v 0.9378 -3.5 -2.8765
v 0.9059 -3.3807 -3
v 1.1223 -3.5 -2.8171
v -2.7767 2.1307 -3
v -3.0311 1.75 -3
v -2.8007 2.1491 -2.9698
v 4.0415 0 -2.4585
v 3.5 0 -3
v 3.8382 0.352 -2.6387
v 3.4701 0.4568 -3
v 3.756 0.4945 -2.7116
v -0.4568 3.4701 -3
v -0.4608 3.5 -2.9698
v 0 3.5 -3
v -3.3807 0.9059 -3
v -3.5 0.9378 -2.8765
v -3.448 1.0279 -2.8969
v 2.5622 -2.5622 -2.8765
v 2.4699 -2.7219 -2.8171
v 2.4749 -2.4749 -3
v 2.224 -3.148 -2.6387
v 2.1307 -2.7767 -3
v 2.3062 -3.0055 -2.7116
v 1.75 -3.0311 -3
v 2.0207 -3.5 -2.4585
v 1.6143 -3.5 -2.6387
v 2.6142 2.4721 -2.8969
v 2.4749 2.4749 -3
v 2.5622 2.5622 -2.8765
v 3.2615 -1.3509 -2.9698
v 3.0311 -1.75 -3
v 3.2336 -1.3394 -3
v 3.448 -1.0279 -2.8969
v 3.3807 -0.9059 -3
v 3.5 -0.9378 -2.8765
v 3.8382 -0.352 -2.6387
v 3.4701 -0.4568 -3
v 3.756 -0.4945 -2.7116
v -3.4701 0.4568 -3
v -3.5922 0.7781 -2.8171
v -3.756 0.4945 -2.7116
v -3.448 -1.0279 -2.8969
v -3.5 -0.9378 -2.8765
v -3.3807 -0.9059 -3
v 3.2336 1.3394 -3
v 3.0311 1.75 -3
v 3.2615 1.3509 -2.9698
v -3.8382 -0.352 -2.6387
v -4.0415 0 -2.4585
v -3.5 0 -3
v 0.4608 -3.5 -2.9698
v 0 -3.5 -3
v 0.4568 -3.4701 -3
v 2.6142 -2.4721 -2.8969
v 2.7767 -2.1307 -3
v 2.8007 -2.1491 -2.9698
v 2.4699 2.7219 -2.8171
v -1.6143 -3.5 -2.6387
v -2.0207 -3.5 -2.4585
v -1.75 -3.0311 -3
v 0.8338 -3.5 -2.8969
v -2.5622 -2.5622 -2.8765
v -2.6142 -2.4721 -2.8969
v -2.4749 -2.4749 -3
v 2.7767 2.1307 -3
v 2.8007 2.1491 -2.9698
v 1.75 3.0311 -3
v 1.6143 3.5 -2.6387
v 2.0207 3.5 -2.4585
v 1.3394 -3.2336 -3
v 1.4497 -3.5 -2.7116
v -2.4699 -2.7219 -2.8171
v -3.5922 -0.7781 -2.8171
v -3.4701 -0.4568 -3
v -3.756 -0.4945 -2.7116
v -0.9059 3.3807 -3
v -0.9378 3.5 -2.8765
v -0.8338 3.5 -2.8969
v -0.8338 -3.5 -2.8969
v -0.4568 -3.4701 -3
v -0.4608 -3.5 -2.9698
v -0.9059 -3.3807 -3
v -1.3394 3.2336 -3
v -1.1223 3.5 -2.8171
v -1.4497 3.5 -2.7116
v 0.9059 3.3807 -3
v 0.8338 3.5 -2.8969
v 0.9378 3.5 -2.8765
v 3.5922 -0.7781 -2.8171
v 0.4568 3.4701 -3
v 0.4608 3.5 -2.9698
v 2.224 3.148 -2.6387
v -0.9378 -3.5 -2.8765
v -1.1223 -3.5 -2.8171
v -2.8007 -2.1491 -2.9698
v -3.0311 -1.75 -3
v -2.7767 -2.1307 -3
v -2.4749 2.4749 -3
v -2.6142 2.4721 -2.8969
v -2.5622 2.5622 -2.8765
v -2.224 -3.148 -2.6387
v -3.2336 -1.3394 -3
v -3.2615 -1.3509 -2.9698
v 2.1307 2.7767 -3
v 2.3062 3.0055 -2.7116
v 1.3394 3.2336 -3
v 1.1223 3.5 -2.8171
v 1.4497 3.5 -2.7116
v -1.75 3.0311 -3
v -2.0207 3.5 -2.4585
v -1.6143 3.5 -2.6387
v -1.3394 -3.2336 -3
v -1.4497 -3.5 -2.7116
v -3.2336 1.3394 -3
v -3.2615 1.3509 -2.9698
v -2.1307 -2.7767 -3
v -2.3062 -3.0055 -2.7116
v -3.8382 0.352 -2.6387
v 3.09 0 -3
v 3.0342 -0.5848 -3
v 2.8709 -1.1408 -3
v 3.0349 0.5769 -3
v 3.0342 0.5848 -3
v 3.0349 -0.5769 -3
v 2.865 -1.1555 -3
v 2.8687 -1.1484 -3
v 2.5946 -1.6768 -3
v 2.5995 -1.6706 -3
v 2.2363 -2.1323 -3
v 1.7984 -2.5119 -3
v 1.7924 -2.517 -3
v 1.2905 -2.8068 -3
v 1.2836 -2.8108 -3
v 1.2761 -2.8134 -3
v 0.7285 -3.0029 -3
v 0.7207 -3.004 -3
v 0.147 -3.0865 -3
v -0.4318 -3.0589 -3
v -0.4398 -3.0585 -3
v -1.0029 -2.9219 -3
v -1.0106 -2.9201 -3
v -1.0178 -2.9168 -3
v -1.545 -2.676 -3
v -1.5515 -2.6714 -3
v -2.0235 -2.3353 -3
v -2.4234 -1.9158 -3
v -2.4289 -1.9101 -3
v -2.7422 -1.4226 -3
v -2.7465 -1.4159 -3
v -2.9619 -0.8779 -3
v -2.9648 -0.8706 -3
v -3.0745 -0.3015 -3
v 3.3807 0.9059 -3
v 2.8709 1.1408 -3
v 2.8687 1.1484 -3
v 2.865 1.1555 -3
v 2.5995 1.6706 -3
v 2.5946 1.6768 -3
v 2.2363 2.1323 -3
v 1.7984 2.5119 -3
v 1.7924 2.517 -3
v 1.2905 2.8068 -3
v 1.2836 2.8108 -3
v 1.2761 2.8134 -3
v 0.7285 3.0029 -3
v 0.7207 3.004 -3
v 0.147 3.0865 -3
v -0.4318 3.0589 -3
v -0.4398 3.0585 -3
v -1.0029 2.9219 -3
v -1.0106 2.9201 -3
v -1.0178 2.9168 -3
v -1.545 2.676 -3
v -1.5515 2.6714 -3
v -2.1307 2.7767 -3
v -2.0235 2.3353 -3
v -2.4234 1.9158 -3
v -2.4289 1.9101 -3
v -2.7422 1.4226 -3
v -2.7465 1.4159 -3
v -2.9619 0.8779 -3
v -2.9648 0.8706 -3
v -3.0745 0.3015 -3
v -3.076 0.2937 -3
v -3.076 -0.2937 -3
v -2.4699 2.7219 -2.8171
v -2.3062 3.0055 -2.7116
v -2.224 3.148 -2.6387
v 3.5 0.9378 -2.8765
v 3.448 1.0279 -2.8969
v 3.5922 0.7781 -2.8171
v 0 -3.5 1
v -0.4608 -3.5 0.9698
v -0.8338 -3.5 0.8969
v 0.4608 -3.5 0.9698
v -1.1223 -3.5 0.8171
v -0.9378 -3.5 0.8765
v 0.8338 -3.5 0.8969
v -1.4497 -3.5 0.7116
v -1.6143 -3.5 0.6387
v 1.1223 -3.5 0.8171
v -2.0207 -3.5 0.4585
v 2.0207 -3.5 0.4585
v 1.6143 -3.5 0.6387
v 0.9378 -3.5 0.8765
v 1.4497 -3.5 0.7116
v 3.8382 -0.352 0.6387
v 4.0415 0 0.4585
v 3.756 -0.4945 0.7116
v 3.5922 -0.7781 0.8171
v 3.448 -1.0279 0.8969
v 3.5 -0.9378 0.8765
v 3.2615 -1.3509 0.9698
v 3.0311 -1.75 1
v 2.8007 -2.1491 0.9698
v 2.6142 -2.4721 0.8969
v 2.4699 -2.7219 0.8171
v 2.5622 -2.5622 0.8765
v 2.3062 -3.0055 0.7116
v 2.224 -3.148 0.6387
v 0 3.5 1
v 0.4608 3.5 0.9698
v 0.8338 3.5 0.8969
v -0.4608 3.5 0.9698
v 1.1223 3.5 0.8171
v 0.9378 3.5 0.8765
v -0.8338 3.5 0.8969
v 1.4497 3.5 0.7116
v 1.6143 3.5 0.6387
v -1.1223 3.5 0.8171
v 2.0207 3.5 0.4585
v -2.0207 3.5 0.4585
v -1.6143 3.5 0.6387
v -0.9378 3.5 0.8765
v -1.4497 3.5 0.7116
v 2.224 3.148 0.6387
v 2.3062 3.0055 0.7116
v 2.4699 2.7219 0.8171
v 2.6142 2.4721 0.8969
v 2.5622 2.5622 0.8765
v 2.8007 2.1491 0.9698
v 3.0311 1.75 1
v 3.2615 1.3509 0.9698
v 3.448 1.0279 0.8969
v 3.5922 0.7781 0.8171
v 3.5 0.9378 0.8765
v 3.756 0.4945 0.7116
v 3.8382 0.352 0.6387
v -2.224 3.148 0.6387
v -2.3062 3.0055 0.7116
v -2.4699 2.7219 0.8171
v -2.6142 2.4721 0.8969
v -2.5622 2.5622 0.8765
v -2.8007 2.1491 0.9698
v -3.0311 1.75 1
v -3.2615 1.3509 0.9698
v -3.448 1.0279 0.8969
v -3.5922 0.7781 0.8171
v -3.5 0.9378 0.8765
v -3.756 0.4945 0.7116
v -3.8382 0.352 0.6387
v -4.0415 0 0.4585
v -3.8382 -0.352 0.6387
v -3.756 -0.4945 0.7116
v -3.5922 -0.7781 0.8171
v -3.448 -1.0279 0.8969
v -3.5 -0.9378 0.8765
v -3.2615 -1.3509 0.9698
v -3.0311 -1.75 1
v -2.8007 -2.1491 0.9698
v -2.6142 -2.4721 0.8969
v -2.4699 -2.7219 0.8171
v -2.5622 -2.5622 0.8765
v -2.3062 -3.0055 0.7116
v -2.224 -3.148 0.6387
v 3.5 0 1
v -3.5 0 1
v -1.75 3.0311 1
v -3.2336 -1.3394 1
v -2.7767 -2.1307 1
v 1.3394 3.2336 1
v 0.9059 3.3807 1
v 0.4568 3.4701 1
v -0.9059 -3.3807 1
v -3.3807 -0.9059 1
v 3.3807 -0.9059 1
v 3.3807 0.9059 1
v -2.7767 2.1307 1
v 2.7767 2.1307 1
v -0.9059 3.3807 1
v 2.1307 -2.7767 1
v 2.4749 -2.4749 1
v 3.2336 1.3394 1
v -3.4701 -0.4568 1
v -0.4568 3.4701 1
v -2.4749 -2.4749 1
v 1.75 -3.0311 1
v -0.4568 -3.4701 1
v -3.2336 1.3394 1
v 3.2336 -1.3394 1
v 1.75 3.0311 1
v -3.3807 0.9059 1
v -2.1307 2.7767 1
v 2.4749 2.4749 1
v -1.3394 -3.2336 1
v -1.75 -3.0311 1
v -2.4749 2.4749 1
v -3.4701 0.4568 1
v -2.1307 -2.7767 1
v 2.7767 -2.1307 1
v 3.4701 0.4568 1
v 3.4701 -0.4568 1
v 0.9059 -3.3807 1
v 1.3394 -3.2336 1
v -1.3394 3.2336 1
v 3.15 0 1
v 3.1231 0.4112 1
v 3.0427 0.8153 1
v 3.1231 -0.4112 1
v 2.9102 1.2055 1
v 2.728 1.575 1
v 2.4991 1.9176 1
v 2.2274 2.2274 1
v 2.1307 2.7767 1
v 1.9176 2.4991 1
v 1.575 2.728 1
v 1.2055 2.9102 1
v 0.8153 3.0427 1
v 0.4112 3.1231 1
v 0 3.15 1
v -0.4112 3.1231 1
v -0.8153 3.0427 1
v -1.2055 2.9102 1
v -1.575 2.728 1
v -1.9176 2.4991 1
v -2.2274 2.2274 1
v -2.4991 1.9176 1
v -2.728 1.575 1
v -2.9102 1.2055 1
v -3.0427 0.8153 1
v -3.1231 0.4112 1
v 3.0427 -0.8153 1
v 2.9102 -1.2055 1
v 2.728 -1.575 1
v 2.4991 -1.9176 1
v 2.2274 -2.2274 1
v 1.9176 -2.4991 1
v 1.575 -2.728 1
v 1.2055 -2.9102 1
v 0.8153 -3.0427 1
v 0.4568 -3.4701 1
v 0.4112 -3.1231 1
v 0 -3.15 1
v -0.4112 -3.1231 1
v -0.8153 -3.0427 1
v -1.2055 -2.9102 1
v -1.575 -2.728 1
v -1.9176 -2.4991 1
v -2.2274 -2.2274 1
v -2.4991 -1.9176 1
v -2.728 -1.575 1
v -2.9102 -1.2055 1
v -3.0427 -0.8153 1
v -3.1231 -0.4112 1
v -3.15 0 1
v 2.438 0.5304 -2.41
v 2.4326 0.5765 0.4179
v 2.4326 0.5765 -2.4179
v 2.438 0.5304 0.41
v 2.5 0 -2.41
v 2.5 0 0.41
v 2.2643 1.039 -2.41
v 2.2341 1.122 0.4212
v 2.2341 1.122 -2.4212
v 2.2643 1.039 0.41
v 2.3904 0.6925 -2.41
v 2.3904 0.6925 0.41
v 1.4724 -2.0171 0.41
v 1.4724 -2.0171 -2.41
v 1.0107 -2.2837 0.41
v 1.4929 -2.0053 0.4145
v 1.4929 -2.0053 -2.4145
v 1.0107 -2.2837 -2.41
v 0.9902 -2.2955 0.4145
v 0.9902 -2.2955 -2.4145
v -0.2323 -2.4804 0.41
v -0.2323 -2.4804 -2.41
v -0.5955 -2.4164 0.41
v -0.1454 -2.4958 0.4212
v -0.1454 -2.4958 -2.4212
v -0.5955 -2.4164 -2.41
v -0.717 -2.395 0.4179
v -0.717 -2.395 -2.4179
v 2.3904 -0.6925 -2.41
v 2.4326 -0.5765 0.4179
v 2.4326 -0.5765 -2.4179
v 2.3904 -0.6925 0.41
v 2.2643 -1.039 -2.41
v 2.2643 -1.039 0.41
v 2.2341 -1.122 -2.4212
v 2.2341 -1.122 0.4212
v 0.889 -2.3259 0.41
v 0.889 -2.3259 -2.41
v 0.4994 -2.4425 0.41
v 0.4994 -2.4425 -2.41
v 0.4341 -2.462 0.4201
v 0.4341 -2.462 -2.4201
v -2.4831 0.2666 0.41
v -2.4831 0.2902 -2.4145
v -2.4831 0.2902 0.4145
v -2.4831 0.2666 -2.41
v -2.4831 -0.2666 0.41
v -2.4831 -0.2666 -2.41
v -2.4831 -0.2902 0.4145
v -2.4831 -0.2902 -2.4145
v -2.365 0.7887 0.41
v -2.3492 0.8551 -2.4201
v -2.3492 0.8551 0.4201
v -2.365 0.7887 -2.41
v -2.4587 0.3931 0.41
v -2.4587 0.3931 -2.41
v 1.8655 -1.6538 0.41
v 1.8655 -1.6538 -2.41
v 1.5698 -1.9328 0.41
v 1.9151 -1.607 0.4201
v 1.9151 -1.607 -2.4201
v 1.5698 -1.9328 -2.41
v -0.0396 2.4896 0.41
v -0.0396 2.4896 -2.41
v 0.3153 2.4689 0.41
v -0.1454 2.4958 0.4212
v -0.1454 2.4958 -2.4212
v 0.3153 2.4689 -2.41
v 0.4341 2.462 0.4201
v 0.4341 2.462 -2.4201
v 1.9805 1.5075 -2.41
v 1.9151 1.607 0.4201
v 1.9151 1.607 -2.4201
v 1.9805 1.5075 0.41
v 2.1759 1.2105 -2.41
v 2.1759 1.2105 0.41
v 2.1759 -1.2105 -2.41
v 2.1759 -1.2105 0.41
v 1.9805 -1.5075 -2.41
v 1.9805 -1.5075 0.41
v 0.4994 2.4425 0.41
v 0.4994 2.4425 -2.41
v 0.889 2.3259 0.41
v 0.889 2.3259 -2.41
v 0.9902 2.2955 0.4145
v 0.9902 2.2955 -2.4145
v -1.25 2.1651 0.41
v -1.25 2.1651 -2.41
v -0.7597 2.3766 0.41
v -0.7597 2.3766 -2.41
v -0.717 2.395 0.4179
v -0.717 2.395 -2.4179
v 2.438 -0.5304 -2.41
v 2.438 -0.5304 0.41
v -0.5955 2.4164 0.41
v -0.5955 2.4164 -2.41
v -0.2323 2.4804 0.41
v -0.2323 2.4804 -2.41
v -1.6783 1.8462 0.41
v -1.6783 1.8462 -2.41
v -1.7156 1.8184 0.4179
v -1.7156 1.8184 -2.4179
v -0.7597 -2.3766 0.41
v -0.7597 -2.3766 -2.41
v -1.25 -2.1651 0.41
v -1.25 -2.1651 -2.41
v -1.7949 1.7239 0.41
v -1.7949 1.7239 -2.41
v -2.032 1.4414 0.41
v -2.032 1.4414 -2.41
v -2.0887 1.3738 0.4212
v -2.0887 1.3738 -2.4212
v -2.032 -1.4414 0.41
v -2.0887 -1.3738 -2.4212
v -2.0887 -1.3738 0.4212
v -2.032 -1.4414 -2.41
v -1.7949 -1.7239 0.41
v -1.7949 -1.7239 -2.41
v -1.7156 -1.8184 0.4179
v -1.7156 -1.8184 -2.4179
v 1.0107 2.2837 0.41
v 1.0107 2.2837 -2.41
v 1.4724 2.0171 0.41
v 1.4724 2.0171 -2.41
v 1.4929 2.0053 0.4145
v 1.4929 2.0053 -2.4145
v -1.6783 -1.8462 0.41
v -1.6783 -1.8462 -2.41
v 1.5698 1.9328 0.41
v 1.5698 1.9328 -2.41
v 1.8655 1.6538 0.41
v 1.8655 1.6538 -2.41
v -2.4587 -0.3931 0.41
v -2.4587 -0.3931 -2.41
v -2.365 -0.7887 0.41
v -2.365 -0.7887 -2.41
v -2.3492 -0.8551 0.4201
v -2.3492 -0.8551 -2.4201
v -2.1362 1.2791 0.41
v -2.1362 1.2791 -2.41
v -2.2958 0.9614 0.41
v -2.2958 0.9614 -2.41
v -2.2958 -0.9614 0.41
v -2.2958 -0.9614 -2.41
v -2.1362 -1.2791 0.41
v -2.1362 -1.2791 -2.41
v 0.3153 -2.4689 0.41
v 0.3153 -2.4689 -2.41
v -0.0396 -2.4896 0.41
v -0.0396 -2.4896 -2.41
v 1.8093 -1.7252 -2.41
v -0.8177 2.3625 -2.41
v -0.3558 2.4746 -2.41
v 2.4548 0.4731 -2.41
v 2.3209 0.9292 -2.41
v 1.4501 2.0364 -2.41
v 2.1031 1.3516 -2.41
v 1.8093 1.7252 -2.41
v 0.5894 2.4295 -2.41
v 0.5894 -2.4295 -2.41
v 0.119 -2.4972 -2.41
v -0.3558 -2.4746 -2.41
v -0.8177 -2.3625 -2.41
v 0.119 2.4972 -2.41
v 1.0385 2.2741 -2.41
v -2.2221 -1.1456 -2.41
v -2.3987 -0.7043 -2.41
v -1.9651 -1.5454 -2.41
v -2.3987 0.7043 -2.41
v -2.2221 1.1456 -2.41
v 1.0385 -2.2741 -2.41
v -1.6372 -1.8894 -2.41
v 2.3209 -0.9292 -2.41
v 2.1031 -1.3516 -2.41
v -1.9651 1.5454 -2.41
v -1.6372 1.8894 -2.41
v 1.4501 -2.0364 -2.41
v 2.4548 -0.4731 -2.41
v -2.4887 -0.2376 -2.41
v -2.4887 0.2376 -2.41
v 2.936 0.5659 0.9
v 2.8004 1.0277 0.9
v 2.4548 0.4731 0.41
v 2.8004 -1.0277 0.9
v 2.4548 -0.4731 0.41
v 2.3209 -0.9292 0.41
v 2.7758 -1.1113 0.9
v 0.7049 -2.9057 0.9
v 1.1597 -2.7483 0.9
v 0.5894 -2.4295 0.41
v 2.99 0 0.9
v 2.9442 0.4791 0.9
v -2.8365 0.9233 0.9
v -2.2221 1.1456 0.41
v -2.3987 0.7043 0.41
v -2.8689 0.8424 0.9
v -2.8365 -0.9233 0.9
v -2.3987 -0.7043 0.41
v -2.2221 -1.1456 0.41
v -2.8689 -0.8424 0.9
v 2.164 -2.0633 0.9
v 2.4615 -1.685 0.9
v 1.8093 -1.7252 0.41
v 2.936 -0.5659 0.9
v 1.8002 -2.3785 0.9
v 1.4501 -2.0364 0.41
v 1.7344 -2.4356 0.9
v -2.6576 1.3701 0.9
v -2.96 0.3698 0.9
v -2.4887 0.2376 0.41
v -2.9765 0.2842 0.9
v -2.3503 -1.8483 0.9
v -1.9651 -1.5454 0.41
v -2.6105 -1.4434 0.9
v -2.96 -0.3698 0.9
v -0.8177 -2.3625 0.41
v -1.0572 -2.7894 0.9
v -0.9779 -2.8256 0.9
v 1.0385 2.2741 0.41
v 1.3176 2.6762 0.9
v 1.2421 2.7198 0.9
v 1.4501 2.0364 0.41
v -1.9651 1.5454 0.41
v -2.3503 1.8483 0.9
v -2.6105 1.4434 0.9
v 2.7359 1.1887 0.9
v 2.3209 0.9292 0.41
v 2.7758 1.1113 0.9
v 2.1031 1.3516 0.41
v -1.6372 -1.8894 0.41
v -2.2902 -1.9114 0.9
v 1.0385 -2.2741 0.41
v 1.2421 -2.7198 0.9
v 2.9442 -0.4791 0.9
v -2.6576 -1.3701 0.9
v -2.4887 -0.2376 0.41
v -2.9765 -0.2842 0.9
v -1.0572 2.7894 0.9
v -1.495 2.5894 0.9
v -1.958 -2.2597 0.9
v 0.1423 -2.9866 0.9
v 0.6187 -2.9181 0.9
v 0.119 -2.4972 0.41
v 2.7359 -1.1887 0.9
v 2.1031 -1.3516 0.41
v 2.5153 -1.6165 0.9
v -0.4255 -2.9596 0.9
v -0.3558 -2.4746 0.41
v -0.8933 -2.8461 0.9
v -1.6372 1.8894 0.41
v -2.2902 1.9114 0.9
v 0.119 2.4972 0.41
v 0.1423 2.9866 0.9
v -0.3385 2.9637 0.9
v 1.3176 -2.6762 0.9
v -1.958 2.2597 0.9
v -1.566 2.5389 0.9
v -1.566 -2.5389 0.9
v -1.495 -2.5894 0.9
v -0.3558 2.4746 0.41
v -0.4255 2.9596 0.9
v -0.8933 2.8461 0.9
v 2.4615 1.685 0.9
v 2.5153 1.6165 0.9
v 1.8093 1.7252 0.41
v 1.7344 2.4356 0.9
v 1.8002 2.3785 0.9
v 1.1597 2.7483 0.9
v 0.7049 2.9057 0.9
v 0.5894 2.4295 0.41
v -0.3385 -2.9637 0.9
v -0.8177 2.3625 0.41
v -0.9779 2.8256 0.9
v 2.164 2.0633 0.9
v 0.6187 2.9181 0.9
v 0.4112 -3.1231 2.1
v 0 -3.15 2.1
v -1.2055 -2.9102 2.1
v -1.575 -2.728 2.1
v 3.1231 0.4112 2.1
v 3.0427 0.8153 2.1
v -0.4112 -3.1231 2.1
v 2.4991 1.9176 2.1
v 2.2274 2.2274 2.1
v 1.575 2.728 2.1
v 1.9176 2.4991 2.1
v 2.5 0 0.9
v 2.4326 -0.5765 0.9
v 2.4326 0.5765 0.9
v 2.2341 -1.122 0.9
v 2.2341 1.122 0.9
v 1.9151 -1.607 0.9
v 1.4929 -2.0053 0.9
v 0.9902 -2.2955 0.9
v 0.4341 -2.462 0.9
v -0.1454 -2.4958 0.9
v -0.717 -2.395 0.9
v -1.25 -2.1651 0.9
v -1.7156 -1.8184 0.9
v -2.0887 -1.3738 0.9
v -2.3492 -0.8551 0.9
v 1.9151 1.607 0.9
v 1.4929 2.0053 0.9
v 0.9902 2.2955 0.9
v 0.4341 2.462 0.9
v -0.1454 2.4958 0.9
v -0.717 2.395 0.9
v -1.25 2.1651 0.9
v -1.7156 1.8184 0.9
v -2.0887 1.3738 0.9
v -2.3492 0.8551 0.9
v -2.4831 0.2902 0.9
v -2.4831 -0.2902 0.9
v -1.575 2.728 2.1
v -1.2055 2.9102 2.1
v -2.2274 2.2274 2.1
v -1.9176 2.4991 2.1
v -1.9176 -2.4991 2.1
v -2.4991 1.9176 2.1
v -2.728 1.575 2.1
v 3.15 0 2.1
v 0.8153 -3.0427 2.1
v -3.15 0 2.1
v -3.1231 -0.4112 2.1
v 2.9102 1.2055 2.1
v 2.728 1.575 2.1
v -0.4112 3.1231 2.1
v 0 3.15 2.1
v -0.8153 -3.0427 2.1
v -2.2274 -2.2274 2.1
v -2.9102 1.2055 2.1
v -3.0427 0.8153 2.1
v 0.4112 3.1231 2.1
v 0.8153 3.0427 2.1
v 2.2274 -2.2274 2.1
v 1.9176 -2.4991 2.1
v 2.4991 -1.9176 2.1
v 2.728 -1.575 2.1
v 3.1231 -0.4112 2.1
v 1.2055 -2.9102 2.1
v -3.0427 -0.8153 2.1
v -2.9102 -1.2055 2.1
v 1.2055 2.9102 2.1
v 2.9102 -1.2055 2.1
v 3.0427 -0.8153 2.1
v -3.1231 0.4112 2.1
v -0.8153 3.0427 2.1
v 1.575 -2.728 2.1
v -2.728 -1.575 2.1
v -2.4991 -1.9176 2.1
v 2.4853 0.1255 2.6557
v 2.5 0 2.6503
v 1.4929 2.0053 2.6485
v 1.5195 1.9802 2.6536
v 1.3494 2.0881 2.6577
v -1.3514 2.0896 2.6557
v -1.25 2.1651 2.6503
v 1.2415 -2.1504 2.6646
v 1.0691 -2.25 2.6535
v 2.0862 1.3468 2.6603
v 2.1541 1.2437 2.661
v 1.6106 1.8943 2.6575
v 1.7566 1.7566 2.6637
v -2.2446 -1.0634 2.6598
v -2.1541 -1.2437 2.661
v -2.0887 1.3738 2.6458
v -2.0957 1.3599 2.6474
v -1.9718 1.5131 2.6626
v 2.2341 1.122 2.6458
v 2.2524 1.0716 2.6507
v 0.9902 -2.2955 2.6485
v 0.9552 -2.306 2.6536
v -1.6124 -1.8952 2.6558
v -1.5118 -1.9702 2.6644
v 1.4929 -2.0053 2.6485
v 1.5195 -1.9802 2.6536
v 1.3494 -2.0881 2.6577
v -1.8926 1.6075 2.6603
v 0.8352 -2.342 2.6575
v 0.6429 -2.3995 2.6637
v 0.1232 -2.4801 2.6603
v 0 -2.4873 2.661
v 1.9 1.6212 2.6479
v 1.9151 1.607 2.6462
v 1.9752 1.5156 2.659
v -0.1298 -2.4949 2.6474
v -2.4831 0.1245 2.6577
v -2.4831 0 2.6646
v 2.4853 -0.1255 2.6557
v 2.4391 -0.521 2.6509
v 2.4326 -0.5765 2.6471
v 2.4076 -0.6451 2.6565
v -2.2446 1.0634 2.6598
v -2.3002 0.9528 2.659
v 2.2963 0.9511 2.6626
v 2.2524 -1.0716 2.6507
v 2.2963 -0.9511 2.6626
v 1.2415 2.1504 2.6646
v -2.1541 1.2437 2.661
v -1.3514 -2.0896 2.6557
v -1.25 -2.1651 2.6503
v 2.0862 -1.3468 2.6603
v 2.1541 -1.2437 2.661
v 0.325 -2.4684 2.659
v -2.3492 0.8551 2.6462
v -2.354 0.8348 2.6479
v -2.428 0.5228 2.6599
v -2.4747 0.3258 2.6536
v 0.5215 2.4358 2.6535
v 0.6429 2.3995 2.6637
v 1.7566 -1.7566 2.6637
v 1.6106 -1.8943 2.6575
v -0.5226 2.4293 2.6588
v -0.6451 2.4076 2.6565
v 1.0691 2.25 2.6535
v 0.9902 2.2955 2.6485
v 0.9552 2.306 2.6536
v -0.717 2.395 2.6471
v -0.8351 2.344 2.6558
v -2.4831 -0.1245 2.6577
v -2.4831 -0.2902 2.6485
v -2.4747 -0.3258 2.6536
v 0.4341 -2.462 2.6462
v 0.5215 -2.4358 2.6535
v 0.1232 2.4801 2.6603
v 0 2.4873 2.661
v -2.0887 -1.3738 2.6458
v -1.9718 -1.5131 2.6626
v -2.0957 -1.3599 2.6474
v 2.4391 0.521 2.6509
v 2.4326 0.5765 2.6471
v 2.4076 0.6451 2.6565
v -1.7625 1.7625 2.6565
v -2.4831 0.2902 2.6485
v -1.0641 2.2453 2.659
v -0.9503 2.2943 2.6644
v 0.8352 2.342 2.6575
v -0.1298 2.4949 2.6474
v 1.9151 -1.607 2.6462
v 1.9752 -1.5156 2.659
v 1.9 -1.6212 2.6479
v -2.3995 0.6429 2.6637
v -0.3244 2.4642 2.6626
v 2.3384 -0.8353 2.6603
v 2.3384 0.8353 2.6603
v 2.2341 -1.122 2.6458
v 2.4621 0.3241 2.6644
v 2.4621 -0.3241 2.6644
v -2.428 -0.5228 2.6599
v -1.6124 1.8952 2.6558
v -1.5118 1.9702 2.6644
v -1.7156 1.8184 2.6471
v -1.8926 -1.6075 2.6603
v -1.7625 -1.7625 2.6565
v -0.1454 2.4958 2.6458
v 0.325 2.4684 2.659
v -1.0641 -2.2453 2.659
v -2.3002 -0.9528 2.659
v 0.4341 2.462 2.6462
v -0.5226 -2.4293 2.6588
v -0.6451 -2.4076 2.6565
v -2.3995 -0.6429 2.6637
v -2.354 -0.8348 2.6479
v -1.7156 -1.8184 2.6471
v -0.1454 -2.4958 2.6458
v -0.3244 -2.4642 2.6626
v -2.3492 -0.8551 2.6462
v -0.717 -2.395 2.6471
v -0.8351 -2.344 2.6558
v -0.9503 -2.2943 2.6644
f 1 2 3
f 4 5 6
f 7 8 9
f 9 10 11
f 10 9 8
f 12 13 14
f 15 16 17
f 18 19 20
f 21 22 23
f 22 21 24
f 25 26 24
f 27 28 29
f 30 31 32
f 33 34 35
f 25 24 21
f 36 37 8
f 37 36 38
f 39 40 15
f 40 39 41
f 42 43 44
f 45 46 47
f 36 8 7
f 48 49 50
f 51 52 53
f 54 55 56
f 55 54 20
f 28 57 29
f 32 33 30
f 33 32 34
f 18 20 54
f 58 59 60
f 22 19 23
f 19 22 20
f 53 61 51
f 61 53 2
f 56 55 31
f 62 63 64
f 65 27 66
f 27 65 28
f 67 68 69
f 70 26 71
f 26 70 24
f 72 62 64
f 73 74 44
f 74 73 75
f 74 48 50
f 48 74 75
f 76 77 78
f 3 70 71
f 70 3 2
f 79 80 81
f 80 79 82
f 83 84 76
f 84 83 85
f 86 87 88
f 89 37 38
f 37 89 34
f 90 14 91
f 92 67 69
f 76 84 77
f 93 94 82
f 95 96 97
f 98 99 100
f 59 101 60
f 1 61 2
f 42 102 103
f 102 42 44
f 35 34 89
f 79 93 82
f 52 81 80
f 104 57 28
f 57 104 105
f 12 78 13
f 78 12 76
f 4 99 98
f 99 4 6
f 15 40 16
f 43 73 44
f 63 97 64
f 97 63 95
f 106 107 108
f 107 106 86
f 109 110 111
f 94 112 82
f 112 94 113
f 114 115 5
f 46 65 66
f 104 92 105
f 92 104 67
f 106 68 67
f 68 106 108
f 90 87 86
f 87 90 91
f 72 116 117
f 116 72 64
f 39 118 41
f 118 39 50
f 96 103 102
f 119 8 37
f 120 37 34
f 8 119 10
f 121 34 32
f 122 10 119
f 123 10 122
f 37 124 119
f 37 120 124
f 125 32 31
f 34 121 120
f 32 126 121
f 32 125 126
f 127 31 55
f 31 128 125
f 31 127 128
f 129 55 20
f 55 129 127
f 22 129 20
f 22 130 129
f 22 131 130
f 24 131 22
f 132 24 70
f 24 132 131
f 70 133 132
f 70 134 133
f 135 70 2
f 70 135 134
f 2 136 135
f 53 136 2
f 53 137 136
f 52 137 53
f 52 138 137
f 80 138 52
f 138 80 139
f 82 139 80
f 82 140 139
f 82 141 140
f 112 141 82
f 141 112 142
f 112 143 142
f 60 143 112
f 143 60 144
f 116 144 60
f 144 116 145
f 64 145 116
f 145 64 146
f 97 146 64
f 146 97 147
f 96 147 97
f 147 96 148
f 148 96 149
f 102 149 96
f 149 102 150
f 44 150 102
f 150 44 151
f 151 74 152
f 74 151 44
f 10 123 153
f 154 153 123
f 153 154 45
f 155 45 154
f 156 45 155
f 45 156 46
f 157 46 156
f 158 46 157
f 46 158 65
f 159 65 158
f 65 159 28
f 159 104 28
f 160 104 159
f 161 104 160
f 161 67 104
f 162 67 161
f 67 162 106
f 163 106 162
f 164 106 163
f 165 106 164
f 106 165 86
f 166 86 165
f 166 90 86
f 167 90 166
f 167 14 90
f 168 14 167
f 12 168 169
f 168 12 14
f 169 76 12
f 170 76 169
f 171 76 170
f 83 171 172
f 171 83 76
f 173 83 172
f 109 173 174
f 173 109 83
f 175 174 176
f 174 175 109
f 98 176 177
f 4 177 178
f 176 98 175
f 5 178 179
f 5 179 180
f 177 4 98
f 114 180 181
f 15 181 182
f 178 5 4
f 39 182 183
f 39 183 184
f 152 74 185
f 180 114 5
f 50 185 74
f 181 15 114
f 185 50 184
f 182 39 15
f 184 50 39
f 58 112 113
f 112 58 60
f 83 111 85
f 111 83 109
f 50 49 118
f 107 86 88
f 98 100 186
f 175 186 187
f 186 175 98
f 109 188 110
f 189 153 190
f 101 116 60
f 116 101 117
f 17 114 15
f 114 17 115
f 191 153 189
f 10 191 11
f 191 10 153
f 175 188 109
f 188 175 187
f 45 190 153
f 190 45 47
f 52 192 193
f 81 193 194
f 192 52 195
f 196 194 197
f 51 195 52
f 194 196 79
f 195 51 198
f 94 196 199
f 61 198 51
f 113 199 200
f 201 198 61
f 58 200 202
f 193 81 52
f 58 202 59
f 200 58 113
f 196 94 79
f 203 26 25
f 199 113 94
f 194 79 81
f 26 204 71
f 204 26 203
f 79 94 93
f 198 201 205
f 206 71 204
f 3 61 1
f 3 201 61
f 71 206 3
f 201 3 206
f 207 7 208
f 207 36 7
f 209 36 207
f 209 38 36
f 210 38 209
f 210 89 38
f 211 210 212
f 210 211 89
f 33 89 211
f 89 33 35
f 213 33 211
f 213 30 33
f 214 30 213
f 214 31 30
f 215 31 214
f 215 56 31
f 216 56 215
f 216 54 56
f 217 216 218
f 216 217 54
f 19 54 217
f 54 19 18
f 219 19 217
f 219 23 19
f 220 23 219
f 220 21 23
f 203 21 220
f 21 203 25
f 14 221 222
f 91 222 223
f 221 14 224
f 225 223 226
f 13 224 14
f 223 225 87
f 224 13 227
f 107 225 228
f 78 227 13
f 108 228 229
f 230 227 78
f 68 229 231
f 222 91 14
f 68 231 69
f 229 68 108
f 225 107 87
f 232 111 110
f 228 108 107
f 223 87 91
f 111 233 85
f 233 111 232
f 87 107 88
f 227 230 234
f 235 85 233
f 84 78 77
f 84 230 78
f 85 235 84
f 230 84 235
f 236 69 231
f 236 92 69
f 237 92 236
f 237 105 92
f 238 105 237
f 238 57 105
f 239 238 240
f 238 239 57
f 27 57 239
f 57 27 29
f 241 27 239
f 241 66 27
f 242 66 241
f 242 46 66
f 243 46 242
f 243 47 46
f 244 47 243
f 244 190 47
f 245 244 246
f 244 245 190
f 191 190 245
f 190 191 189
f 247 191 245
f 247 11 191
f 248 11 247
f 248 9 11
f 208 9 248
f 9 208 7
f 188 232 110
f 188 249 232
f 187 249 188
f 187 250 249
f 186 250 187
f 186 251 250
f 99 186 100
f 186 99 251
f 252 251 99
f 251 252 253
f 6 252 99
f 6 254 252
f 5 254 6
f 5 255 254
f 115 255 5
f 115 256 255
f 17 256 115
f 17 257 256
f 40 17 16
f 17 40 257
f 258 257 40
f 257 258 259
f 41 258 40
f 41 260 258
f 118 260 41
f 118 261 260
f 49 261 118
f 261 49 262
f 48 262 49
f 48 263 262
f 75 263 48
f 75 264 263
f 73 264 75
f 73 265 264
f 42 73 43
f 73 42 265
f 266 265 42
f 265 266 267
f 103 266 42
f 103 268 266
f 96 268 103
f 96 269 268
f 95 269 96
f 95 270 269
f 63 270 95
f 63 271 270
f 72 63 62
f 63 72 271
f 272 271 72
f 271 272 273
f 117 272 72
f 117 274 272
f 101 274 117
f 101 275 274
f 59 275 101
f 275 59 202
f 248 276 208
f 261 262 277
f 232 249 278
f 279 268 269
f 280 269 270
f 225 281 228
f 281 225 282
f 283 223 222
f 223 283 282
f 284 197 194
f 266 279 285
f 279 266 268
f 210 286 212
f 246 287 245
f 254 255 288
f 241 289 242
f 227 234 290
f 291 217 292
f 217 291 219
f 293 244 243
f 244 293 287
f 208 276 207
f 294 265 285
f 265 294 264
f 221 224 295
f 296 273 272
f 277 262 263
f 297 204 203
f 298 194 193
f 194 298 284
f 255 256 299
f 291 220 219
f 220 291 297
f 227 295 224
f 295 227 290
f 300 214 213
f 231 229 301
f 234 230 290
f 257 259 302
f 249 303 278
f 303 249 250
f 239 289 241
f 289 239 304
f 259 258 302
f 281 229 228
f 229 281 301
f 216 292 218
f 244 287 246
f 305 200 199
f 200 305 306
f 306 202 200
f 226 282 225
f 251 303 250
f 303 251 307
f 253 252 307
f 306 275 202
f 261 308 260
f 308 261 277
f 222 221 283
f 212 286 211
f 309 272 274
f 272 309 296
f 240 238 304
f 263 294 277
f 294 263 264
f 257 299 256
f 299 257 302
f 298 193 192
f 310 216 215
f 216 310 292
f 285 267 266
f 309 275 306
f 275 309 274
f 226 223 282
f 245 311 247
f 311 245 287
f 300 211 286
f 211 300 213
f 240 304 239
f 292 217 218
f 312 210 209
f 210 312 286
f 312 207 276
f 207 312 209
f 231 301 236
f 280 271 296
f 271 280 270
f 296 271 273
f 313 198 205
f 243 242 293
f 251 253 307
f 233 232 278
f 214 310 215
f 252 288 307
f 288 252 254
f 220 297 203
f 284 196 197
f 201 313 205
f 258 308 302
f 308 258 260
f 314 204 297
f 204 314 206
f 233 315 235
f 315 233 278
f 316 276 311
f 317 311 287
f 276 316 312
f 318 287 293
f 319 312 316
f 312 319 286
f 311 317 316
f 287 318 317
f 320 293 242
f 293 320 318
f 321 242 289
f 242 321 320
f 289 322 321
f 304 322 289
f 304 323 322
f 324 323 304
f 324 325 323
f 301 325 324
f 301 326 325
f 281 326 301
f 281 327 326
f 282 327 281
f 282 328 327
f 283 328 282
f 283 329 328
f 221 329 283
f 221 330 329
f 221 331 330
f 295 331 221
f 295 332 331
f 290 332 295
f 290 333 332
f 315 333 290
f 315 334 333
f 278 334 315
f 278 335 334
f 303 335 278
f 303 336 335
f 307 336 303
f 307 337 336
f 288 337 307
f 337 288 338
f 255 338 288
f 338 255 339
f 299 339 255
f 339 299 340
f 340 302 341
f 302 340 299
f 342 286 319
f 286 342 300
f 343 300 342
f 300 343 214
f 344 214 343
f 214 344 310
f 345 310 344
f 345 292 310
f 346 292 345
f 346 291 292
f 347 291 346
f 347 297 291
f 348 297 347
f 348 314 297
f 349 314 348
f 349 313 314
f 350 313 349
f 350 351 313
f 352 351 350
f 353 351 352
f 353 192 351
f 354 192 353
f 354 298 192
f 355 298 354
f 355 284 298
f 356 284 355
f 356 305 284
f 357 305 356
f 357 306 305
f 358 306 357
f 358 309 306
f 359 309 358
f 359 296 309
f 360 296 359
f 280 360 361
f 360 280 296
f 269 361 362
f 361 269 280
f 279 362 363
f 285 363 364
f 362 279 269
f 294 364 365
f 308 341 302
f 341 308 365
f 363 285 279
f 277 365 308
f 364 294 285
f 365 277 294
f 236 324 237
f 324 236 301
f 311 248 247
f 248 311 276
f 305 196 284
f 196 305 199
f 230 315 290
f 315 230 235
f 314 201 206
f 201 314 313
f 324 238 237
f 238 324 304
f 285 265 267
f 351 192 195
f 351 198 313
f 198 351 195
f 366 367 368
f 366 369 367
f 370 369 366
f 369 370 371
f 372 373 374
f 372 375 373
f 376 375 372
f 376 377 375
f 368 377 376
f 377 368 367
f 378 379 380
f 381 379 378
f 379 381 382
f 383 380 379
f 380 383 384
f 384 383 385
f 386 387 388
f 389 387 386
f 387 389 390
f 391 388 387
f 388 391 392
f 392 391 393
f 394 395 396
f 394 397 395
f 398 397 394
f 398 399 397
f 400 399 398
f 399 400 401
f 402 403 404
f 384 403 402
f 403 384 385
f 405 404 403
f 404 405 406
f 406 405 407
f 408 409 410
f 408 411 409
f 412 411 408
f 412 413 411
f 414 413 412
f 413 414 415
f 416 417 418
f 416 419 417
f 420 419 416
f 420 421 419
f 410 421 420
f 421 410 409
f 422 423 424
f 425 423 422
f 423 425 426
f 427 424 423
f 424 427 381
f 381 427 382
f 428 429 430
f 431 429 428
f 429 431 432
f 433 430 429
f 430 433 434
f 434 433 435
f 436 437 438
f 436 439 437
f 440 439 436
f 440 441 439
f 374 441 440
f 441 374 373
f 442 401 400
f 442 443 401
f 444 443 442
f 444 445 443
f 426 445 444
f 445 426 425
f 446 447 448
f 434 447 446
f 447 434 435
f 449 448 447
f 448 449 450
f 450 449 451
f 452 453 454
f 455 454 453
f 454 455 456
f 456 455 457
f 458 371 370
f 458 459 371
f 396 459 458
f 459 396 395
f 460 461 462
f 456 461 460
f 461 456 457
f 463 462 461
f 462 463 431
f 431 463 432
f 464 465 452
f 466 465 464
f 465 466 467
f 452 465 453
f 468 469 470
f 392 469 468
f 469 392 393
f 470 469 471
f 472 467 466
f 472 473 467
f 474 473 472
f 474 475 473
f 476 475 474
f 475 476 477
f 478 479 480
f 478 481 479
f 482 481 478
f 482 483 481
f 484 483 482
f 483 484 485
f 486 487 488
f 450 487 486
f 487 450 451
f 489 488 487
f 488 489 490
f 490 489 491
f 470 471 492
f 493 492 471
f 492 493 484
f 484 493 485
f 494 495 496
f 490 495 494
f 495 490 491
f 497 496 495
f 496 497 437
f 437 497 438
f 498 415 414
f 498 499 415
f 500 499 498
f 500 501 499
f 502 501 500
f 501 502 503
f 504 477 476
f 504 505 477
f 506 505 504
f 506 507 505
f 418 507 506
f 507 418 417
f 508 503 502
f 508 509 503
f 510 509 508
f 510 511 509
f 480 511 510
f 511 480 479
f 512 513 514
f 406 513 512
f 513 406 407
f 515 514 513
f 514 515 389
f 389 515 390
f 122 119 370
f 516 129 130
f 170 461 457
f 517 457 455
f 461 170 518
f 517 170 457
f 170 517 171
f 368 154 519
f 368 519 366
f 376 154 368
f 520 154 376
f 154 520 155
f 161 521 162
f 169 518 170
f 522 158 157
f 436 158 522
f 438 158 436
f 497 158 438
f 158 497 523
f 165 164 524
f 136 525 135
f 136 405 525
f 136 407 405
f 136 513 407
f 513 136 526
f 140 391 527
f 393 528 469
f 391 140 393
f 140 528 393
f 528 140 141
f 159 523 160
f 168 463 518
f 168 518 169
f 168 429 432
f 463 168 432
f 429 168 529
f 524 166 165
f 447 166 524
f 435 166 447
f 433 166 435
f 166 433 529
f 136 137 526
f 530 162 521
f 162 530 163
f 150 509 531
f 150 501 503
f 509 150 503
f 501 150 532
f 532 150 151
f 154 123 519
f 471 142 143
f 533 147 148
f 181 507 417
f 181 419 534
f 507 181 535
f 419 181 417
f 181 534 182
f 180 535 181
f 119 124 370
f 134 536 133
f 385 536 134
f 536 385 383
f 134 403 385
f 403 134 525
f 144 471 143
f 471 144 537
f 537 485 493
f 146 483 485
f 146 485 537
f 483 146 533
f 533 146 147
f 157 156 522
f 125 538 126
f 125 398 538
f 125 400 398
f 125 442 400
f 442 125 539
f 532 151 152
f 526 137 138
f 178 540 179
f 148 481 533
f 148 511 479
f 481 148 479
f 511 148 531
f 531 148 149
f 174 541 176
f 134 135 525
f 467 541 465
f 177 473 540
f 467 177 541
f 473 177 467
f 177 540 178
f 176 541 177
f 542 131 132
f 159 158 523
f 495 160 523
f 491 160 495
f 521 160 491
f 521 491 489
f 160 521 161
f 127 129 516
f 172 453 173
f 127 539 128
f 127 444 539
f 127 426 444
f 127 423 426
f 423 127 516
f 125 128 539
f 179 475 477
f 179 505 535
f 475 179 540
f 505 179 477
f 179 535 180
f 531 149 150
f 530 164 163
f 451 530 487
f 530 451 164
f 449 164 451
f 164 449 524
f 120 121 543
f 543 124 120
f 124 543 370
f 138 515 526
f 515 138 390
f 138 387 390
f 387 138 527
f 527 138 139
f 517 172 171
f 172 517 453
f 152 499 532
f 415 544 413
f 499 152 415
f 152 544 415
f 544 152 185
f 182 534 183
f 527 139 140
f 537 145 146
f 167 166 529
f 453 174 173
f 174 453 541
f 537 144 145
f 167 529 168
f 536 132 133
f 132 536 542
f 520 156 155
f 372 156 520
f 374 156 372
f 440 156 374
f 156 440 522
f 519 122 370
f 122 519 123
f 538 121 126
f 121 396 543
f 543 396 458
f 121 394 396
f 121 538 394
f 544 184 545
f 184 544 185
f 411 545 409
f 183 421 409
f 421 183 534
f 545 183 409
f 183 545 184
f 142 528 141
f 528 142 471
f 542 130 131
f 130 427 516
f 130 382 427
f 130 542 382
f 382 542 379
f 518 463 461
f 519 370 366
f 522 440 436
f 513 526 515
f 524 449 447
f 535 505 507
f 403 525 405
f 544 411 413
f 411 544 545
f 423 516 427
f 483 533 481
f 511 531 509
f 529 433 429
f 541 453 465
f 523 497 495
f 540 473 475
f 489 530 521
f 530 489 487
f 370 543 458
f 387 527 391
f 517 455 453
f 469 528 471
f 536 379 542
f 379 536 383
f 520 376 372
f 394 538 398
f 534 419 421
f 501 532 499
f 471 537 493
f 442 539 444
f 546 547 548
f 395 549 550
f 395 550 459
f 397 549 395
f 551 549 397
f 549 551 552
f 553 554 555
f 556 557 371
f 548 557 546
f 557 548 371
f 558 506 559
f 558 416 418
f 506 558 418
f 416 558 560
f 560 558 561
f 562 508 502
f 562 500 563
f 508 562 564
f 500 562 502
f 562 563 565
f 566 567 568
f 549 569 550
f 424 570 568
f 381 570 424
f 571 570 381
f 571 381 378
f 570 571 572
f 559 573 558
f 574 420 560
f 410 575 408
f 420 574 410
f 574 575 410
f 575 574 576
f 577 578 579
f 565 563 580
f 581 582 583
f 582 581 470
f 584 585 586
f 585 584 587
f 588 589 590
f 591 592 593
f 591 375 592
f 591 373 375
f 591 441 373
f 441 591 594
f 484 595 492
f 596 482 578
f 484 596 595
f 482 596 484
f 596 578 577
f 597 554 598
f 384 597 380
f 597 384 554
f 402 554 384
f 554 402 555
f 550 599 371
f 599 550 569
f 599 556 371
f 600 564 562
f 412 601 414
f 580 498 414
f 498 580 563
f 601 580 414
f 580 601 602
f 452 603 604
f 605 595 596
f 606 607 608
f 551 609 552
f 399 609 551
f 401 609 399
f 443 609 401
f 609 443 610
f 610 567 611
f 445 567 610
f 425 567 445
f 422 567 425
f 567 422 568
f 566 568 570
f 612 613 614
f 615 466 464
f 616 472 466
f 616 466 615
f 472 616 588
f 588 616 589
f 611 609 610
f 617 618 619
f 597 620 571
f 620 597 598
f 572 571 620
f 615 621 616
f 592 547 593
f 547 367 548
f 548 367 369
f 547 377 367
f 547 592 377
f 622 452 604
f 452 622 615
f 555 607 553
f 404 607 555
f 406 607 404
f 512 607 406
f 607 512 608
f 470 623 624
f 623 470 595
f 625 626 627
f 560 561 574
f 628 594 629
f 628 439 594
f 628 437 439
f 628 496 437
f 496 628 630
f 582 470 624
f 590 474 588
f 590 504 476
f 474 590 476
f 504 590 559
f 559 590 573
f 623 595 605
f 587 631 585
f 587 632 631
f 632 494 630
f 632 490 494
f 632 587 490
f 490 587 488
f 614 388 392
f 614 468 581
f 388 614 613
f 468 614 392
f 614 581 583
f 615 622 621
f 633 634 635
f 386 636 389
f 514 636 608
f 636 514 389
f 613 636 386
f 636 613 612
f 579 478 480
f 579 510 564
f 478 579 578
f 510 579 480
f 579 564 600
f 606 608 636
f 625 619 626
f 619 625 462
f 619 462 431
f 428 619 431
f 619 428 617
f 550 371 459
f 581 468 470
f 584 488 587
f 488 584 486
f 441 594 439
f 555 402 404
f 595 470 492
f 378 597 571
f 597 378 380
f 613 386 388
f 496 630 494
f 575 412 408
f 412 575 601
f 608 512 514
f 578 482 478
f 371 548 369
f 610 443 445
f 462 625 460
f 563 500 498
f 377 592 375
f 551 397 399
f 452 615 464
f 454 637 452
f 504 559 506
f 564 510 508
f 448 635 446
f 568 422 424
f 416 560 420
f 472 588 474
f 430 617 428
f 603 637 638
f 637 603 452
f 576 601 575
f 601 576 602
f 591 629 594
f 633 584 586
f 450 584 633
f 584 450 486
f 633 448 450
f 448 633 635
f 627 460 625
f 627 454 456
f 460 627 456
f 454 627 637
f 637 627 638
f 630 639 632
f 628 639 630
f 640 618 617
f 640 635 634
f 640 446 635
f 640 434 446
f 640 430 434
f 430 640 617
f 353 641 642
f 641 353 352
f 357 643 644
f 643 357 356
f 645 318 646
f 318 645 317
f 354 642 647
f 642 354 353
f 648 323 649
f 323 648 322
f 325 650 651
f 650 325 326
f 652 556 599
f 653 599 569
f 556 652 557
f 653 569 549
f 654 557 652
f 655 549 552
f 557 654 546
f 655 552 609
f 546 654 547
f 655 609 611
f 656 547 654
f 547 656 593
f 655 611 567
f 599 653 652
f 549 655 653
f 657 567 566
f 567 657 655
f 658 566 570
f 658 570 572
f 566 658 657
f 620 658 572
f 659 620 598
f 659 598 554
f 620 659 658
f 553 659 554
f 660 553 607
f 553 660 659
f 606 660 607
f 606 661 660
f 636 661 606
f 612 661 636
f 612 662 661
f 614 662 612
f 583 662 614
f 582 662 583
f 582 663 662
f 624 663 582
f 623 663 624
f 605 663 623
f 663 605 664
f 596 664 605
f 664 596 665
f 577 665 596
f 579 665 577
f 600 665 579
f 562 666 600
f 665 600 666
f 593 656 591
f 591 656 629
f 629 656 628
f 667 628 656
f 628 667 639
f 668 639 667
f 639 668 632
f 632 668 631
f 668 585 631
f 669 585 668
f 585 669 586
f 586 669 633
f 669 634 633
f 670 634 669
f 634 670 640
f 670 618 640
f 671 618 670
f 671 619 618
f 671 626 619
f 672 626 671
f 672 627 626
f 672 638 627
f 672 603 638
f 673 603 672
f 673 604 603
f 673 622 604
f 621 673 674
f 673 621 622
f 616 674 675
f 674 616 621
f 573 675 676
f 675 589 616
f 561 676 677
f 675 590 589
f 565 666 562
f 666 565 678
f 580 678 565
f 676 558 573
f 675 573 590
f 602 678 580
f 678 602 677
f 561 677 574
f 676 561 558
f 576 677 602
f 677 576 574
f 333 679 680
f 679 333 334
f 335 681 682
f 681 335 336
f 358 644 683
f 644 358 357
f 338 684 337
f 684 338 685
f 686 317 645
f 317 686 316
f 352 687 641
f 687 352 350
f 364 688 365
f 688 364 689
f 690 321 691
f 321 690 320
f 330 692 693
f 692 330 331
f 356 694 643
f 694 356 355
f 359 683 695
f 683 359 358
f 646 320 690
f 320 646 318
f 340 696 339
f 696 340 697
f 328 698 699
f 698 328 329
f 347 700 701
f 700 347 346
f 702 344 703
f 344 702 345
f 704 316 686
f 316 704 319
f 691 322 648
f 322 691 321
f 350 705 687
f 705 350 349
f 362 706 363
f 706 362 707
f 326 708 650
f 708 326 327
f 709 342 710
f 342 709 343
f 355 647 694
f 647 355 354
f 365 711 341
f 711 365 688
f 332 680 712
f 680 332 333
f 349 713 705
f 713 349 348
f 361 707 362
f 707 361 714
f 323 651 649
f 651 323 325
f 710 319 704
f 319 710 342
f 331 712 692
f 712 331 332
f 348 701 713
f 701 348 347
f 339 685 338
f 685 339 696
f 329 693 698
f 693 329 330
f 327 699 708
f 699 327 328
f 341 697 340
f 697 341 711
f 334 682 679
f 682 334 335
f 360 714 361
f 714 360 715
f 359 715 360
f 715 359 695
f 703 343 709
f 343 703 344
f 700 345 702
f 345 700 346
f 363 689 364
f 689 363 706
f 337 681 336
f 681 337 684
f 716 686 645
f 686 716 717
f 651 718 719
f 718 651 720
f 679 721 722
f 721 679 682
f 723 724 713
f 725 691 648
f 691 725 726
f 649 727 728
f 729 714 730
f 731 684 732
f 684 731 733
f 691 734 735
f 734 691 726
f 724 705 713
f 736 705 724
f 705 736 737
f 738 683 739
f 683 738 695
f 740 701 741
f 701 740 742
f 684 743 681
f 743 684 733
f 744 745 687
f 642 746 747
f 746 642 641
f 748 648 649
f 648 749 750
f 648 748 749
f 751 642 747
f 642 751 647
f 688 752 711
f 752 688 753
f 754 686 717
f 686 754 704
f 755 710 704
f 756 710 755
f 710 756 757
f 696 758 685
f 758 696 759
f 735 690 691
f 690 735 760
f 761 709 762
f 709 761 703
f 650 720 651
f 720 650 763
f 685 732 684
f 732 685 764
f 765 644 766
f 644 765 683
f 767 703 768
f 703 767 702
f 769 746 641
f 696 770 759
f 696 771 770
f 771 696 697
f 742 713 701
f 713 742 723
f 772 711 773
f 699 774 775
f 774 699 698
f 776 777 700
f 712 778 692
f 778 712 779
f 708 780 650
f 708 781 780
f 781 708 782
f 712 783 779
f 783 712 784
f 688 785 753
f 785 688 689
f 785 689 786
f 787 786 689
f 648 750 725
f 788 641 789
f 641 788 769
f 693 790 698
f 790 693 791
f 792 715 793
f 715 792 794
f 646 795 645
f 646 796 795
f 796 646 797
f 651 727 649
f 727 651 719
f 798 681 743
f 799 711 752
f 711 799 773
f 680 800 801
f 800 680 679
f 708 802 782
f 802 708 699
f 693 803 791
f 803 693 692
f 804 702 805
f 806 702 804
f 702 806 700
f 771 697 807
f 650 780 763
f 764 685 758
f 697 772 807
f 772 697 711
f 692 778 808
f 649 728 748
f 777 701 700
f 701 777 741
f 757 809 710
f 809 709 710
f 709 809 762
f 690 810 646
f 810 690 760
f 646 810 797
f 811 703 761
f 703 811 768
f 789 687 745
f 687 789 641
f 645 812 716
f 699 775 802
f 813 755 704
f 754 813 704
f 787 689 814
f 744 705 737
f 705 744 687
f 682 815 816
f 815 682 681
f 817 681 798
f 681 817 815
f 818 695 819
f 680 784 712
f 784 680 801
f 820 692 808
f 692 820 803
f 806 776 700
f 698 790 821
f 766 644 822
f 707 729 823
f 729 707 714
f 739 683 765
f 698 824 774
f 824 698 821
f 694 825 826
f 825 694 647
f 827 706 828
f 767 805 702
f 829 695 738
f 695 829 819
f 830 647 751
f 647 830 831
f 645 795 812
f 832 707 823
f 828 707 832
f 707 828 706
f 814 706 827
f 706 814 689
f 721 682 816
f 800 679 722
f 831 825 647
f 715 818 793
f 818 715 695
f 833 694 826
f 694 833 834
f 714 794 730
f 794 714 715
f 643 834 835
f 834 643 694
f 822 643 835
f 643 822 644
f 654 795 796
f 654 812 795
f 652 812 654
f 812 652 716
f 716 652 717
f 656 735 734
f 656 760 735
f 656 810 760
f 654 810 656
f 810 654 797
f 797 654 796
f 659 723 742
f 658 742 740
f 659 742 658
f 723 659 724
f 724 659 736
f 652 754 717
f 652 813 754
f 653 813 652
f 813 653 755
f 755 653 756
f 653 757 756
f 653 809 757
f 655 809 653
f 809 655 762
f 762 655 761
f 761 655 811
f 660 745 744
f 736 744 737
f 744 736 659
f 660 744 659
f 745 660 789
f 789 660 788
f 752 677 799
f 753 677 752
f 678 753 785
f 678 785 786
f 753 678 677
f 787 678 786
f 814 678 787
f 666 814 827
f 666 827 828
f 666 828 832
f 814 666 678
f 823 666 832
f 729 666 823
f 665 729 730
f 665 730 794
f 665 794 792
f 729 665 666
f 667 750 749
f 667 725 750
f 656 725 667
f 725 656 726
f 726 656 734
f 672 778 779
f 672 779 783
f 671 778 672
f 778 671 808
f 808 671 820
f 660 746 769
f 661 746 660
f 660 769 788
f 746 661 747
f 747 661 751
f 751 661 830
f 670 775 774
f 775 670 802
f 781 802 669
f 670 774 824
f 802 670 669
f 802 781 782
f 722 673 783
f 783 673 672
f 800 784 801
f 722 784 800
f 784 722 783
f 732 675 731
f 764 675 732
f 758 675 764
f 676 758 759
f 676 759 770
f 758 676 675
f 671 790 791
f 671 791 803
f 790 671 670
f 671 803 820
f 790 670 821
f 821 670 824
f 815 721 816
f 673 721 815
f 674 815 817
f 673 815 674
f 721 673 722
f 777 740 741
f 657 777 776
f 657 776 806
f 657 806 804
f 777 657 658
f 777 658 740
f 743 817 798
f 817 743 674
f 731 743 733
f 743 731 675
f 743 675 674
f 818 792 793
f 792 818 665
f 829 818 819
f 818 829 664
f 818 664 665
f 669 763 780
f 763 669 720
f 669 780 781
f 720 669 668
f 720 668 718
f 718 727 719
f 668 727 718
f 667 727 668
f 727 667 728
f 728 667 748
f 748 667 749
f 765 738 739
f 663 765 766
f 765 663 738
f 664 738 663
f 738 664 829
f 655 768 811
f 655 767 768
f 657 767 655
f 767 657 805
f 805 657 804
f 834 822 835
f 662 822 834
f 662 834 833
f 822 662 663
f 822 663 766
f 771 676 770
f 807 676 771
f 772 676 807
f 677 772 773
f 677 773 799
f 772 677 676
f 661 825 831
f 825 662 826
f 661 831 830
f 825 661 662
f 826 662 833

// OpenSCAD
use <common.scad>

// 용어
// 1. 잠금 너트(lock nut)
// 2. 대변 거리(across flat)
// 3. 보어(bore)

// M4 규격 기준 높이입니다.
function lock_nut_m4_t() = 4;

module lock_nut_m4(part_color = [0.74, 0.41, 0]) {
    lock_nut(across_flat = 7,
             thickness = lock_nut_m4_t(),
             bore = 5,
             part_color = part_color);
}

lock_nut_m4();
